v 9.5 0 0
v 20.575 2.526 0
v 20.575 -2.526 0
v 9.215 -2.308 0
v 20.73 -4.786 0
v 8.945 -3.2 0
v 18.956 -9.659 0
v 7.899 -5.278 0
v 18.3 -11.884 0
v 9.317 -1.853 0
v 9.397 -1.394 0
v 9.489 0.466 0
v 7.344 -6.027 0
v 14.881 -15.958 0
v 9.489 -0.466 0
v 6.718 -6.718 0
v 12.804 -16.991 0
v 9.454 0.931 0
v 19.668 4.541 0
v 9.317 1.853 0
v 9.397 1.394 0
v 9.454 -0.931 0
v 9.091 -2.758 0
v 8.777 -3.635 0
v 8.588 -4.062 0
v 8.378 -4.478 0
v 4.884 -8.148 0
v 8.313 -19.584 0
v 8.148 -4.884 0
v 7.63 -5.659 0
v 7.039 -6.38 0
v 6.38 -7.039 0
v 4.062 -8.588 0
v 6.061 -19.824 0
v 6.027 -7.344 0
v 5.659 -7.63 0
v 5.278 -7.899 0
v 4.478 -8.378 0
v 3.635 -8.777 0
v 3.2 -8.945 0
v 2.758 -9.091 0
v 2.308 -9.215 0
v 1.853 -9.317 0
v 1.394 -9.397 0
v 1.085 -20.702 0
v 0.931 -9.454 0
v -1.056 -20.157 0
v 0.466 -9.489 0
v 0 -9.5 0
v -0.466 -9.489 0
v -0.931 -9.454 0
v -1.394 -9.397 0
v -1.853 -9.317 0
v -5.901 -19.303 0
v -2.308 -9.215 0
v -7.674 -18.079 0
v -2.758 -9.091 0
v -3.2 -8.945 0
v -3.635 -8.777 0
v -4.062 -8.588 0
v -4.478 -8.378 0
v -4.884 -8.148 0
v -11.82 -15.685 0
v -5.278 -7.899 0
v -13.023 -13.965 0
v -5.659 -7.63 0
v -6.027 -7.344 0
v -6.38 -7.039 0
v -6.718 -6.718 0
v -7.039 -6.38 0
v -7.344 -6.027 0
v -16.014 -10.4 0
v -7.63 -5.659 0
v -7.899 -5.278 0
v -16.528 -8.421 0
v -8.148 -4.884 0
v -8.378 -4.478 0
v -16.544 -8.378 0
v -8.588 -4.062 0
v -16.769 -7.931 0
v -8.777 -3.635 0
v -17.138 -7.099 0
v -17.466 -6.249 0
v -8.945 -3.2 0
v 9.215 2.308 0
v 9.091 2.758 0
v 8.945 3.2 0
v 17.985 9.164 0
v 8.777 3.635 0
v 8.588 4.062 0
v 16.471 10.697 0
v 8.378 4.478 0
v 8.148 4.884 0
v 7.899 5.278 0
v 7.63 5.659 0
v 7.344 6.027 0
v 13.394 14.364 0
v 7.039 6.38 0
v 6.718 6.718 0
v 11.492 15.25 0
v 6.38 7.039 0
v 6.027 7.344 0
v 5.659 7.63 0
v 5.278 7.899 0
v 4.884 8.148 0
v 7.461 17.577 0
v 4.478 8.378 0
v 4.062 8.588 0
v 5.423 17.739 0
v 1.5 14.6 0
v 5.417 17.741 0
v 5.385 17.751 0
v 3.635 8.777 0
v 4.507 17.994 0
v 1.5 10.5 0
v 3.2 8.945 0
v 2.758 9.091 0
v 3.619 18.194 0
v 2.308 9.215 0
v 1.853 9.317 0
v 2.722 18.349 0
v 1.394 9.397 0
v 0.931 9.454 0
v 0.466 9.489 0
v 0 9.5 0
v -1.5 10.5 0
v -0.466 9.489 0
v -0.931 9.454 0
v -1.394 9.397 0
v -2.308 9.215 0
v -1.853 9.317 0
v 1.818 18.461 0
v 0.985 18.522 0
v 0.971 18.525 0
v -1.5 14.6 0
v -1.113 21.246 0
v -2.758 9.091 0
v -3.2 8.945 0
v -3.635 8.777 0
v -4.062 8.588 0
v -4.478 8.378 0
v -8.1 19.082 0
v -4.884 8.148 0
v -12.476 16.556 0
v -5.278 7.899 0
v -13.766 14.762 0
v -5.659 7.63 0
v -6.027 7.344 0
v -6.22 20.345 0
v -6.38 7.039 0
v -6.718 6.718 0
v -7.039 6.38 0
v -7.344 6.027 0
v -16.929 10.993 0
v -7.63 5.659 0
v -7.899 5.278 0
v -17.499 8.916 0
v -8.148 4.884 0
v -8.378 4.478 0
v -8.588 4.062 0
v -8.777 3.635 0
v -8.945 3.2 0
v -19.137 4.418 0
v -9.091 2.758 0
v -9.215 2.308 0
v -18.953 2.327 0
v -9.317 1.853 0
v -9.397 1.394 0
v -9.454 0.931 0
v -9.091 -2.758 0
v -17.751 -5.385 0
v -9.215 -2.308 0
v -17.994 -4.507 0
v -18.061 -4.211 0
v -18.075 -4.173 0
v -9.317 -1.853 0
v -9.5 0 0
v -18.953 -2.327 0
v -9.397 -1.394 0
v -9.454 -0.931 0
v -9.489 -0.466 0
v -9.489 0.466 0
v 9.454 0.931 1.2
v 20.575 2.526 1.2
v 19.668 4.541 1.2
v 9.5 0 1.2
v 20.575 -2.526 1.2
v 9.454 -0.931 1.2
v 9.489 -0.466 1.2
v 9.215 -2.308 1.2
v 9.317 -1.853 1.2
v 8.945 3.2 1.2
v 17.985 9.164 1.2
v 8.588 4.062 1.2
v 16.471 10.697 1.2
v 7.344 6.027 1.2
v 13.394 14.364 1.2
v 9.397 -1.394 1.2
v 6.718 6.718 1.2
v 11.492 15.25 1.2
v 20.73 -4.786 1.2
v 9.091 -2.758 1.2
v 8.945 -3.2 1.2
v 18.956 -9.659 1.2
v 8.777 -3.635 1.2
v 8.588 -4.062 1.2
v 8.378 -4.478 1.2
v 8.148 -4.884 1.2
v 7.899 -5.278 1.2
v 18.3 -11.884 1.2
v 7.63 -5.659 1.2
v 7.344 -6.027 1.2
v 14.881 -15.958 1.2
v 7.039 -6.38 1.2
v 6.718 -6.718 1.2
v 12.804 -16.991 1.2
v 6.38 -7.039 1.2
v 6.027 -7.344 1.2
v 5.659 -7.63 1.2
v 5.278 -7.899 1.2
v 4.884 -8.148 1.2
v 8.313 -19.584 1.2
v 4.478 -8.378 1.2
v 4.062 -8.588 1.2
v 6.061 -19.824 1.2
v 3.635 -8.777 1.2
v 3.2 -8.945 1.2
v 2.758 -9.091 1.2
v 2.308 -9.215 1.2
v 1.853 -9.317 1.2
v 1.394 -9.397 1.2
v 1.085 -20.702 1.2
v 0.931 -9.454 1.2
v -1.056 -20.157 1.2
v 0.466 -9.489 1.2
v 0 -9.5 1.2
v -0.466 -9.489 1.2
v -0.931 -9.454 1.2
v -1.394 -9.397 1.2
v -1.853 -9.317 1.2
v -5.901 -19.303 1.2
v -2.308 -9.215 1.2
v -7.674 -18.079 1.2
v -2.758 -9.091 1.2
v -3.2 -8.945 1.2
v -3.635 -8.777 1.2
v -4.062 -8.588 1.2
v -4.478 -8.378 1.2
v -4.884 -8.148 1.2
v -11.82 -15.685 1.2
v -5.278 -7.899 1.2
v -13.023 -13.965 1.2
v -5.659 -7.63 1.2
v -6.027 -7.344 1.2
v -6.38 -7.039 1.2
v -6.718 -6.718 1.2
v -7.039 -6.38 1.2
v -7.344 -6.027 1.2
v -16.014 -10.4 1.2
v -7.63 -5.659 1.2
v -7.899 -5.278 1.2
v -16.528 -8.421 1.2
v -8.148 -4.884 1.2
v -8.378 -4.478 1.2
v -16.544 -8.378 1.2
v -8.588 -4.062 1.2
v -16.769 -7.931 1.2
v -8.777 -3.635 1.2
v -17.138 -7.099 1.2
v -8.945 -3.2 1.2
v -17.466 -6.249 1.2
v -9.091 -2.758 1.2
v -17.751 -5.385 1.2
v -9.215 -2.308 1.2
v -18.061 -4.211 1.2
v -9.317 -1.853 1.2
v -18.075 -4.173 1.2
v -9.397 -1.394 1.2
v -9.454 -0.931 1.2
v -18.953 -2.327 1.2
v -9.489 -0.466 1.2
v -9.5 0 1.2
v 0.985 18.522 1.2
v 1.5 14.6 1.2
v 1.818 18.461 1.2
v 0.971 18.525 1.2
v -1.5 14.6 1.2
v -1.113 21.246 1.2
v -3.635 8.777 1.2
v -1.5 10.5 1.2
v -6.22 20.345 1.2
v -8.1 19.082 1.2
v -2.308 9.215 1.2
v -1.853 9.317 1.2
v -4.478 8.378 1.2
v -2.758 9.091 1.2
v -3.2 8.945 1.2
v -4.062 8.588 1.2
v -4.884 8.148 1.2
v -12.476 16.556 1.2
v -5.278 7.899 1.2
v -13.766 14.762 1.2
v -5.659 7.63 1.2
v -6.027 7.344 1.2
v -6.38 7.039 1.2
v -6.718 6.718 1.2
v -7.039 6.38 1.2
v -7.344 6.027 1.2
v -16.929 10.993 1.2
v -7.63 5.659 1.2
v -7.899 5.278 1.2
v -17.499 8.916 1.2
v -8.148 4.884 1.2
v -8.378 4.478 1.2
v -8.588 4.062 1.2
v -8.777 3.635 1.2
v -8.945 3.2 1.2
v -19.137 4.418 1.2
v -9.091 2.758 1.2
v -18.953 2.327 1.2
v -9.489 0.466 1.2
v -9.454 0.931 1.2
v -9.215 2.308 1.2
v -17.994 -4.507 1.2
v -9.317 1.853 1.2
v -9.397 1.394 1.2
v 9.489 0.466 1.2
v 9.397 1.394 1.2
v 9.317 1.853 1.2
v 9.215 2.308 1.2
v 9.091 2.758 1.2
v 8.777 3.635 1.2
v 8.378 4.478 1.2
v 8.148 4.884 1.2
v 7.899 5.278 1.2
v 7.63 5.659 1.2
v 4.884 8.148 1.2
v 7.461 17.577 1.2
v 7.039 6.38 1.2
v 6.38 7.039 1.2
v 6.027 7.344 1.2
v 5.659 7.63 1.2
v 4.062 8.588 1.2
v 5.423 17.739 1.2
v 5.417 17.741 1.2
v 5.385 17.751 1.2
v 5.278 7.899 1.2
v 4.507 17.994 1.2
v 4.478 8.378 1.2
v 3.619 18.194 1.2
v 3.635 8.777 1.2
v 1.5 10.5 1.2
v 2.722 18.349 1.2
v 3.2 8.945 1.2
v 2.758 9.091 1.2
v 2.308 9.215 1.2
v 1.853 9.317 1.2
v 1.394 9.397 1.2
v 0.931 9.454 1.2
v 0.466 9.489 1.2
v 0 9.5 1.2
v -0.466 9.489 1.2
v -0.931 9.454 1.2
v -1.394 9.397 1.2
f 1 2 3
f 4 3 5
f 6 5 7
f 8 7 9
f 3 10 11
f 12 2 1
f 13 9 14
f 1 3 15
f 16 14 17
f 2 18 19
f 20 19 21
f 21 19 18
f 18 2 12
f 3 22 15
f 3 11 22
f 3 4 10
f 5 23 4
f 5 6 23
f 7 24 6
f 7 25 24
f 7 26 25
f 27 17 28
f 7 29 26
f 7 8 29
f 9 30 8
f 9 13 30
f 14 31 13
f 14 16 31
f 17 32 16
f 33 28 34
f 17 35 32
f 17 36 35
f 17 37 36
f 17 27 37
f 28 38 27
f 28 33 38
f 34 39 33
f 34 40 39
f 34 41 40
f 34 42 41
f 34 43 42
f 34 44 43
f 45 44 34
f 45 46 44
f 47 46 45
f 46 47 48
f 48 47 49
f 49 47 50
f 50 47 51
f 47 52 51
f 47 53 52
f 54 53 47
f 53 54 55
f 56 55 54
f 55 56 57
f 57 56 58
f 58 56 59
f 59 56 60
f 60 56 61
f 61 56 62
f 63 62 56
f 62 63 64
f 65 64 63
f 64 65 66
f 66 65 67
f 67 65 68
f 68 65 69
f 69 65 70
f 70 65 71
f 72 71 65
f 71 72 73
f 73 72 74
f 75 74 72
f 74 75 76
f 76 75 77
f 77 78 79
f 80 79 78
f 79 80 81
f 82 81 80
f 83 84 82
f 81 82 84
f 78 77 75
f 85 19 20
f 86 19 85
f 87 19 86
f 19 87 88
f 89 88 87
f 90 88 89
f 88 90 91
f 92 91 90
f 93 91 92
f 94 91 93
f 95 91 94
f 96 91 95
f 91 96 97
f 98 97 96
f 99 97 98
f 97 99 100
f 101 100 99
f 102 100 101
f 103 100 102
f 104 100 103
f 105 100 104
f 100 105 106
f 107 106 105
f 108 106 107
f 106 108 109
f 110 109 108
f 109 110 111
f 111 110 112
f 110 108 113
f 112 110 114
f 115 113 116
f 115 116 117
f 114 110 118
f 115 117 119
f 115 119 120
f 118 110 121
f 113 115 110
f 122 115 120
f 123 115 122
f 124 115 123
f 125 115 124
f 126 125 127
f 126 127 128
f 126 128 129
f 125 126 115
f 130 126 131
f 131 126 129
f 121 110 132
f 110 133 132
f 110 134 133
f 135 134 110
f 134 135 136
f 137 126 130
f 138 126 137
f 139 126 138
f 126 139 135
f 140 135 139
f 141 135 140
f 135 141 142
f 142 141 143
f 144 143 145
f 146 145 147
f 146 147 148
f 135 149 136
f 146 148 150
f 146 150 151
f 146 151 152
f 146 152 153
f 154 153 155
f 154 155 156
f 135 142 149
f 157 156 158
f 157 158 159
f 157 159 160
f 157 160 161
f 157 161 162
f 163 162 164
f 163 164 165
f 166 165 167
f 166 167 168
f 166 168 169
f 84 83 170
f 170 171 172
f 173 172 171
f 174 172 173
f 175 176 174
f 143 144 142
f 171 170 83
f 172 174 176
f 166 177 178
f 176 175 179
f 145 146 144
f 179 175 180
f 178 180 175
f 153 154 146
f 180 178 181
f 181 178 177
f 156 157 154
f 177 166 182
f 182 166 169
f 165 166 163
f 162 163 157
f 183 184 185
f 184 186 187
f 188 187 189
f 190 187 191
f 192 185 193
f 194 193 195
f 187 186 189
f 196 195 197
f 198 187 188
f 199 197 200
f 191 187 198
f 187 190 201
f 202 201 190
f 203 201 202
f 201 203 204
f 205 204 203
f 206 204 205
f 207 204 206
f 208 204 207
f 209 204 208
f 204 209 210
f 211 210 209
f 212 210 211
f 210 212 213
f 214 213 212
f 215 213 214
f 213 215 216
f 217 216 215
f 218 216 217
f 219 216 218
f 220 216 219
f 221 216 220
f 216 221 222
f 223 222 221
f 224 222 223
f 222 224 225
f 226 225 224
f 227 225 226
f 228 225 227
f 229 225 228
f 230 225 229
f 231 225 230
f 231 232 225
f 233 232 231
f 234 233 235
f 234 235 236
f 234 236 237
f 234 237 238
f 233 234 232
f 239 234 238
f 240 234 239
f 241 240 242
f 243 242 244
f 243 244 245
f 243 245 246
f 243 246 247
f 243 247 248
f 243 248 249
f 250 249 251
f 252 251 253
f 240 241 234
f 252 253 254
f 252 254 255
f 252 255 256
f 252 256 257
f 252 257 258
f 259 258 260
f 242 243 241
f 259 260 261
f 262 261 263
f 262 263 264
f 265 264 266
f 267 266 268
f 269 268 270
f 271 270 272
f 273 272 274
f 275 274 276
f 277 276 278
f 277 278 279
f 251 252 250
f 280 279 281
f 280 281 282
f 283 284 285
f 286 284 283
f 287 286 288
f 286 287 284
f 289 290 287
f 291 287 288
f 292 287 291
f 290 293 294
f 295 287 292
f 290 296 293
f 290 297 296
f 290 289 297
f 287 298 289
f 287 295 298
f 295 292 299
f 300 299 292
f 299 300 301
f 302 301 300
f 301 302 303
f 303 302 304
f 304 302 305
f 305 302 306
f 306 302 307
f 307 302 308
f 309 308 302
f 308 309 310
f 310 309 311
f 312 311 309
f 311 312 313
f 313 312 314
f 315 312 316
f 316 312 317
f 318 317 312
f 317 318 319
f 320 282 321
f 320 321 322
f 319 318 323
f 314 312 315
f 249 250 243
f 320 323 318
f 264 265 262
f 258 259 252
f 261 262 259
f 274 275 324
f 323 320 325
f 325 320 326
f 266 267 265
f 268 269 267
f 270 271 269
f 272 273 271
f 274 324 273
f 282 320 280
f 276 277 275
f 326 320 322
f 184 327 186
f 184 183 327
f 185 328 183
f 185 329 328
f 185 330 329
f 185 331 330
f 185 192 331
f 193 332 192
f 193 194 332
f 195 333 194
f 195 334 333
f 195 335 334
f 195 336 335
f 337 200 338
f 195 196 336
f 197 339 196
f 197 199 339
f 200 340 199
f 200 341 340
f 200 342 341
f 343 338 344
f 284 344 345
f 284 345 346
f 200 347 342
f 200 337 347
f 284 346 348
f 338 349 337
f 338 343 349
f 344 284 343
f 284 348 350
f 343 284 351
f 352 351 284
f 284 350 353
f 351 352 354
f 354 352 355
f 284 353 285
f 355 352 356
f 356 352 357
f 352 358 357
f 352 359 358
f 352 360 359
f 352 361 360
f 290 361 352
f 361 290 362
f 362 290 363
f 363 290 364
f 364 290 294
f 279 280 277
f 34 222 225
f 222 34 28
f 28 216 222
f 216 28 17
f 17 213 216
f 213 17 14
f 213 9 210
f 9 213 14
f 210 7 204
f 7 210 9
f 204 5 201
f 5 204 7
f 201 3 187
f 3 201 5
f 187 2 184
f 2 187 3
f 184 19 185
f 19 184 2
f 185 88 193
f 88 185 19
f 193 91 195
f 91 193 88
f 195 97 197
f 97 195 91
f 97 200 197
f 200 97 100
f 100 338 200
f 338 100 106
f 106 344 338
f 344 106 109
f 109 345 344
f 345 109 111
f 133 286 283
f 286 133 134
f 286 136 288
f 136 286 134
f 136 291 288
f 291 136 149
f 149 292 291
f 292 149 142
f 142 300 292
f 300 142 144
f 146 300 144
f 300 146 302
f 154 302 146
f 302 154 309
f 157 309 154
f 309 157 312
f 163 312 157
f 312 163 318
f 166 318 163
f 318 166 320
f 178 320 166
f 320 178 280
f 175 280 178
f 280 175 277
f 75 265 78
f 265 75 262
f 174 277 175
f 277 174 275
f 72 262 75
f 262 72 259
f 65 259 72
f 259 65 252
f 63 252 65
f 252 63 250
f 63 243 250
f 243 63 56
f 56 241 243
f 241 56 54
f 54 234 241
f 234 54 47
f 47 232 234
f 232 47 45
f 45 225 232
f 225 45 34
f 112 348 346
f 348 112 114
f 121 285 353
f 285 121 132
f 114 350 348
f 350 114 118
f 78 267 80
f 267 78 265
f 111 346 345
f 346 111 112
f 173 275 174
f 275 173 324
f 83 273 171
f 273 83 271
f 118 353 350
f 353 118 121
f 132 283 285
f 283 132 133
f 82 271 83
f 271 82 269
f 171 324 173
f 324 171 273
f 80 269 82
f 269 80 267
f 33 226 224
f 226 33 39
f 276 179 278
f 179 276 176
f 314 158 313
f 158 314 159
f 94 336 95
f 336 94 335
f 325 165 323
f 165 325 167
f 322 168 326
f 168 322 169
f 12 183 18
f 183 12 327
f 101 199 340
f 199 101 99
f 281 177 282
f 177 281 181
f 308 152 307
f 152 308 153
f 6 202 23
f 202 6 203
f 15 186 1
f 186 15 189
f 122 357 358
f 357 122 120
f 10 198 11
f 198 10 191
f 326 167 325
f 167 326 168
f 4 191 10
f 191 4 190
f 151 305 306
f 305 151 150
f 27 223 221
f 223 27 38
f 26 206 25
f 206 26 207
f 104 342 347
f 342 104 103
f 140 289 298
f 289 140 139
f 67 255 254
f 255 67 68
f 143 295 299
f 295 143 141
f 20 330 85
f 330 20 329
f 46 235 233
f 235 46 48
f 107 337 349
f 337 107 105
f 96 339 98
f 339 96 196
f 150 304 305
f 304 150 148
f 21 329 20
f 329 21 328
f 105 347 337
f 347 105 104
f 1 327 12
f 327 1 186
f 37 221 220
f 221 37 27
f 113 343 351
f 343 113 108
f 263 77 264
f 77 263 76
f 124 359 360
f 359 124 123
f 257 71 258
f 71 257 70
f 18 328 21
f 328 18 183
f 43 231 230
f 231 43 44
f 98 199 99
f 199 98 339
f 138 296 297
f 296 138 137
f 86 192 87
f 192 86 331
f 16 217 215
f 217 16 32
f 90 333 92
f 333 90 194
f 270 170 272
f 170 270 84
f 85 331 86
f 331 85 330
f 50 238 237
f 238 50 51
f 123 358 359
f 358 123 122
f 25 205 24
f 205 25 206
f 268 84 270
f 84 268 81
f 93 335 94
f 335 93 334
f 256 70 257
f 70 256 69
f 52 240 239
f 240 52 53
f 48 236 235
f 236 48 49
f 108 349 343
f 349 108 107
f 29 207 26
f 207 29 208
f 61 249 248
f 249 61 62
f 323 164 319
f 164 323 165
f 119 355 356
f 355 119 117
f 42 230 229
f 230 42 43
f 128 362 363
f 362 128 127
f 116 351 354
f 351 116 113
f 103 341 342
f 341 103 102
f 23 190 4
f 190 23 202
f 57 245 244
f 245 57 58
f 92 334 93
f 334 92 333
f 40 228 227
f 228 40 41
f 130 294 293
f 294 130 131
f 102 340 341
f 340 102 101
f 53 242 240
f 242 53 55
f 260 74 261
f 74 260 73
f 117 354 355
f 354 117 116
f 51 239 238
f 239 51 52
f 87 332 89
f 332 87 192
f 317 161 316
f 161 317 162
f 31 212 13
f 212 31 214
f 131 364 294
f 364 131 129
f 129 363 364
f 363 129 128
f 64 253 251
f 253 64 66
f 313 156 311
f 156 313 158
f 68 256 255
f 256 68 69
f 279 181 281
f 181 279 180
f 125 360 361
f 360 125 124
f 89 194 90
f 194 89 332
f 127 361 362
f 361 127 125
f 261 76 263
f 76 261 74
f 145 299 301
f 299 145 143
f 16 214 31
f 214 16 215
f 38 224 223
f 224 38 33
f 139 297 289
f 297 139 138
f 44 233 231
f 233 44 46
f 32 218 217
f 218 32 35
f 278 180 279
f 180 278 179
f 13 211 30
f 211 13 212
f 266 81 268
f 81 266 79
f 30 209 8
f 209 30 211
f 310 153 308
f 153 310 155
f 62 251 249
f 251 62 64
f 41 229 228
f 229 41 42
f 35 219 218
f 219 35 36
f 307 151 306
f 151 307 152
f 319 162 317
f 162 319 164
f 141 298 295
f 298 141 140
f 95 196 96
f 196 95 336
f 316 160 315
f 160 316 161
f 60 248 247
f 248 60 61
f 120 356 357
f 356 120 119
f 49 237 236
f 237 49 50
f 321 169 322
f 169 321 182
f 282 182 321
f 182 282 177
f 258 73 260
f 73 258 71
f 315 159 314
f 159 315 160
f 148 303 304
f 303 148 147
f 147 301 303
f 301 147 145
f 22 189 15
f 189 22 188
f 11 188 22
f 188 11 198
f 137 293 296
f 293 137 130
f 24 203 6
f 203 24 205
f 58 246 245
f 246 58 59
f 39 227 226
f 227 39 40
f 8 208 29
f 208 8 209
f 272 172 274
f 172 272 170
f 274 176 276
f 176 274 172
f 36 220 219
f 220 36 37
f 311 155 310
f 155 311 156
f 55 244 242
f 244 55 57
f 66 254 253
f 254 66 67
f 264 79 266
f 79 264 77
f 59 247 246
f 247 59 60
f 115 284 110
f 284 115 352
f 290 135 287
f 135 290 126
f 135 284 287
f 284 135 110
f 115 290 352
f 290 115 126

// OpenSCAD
/*
  Elna Supermatic cam 08
  Name: Slanted bars
  Status: candidate

  Generated from measured parametric base v2.
  Surface mode: stepped
*/

include <_elna_measured_common.scad>;

profile_points = [
        [0.9708, 18.5246],
        [5.4235, 17.7395],
        [7.4610, 17.5770],
        [11.4917, 15.2499],
        [13.3944, 14.3638],
        [16.4715, 10.6967],
        [17.9850, 9.1638],
        [19.6677, 4.5406],
        [20.5755, 2.5264],
        [20.5755, -2.5264],
        [20.7297, -4.7858],
        [18.9562, -9.6586],
        [18.2998, -11.8840],
        [14.8812, -15.9581],
        [12.8036, -16.9910],
        [8.3128, -19.5837],
        [6.0609, -19.8242],
        [1.0849, -20.7016],
        [-1.0564, -20.1573],
        [-5.9015, -19.3030],
        [-7.6740, -18.0787],
        [-11.8196, -15.6852],
        [-13.0228, -13.9652],
        [-16.0144, -10.3999],
        [-16.5282, -8.4215],
        [-18.0746, -4.1728],
        [-18.9527, -2.3271],
        [-18.9527, 2.3271],
        [-19.1366, 4.4180],
        [-17.4994, 8.9164],
        [-16.9286, 10.9935],
        [-13.7661, 14.7624],
        [-12.4756, 16.5557],
        [-8.0999, 19.0821],
        [-6.2202, 20.3454],
        [-1.1134, 21.2458]
];

icon_points = [[-1.000,0.180], [-0.820,0.180], [-0.820,0.360], [-0.640,0.360], [-0.640,0.560], [-0.460,0.560], [-0.460,0.740], [-0.280,0.740], [-0.280,0.560], [-0.100,0.560], [-0.100,0.360], [0.080,0.360], [0.080,0.180], [0.260,0.180], [0.260,0.360], [0.440,0.360], [0.440,0.560], [0.620,0.560], [0.620,0.740], [0.800,0.740], [1.000,0.740]];

elna_cam_ring(profile_points=profile_points);
